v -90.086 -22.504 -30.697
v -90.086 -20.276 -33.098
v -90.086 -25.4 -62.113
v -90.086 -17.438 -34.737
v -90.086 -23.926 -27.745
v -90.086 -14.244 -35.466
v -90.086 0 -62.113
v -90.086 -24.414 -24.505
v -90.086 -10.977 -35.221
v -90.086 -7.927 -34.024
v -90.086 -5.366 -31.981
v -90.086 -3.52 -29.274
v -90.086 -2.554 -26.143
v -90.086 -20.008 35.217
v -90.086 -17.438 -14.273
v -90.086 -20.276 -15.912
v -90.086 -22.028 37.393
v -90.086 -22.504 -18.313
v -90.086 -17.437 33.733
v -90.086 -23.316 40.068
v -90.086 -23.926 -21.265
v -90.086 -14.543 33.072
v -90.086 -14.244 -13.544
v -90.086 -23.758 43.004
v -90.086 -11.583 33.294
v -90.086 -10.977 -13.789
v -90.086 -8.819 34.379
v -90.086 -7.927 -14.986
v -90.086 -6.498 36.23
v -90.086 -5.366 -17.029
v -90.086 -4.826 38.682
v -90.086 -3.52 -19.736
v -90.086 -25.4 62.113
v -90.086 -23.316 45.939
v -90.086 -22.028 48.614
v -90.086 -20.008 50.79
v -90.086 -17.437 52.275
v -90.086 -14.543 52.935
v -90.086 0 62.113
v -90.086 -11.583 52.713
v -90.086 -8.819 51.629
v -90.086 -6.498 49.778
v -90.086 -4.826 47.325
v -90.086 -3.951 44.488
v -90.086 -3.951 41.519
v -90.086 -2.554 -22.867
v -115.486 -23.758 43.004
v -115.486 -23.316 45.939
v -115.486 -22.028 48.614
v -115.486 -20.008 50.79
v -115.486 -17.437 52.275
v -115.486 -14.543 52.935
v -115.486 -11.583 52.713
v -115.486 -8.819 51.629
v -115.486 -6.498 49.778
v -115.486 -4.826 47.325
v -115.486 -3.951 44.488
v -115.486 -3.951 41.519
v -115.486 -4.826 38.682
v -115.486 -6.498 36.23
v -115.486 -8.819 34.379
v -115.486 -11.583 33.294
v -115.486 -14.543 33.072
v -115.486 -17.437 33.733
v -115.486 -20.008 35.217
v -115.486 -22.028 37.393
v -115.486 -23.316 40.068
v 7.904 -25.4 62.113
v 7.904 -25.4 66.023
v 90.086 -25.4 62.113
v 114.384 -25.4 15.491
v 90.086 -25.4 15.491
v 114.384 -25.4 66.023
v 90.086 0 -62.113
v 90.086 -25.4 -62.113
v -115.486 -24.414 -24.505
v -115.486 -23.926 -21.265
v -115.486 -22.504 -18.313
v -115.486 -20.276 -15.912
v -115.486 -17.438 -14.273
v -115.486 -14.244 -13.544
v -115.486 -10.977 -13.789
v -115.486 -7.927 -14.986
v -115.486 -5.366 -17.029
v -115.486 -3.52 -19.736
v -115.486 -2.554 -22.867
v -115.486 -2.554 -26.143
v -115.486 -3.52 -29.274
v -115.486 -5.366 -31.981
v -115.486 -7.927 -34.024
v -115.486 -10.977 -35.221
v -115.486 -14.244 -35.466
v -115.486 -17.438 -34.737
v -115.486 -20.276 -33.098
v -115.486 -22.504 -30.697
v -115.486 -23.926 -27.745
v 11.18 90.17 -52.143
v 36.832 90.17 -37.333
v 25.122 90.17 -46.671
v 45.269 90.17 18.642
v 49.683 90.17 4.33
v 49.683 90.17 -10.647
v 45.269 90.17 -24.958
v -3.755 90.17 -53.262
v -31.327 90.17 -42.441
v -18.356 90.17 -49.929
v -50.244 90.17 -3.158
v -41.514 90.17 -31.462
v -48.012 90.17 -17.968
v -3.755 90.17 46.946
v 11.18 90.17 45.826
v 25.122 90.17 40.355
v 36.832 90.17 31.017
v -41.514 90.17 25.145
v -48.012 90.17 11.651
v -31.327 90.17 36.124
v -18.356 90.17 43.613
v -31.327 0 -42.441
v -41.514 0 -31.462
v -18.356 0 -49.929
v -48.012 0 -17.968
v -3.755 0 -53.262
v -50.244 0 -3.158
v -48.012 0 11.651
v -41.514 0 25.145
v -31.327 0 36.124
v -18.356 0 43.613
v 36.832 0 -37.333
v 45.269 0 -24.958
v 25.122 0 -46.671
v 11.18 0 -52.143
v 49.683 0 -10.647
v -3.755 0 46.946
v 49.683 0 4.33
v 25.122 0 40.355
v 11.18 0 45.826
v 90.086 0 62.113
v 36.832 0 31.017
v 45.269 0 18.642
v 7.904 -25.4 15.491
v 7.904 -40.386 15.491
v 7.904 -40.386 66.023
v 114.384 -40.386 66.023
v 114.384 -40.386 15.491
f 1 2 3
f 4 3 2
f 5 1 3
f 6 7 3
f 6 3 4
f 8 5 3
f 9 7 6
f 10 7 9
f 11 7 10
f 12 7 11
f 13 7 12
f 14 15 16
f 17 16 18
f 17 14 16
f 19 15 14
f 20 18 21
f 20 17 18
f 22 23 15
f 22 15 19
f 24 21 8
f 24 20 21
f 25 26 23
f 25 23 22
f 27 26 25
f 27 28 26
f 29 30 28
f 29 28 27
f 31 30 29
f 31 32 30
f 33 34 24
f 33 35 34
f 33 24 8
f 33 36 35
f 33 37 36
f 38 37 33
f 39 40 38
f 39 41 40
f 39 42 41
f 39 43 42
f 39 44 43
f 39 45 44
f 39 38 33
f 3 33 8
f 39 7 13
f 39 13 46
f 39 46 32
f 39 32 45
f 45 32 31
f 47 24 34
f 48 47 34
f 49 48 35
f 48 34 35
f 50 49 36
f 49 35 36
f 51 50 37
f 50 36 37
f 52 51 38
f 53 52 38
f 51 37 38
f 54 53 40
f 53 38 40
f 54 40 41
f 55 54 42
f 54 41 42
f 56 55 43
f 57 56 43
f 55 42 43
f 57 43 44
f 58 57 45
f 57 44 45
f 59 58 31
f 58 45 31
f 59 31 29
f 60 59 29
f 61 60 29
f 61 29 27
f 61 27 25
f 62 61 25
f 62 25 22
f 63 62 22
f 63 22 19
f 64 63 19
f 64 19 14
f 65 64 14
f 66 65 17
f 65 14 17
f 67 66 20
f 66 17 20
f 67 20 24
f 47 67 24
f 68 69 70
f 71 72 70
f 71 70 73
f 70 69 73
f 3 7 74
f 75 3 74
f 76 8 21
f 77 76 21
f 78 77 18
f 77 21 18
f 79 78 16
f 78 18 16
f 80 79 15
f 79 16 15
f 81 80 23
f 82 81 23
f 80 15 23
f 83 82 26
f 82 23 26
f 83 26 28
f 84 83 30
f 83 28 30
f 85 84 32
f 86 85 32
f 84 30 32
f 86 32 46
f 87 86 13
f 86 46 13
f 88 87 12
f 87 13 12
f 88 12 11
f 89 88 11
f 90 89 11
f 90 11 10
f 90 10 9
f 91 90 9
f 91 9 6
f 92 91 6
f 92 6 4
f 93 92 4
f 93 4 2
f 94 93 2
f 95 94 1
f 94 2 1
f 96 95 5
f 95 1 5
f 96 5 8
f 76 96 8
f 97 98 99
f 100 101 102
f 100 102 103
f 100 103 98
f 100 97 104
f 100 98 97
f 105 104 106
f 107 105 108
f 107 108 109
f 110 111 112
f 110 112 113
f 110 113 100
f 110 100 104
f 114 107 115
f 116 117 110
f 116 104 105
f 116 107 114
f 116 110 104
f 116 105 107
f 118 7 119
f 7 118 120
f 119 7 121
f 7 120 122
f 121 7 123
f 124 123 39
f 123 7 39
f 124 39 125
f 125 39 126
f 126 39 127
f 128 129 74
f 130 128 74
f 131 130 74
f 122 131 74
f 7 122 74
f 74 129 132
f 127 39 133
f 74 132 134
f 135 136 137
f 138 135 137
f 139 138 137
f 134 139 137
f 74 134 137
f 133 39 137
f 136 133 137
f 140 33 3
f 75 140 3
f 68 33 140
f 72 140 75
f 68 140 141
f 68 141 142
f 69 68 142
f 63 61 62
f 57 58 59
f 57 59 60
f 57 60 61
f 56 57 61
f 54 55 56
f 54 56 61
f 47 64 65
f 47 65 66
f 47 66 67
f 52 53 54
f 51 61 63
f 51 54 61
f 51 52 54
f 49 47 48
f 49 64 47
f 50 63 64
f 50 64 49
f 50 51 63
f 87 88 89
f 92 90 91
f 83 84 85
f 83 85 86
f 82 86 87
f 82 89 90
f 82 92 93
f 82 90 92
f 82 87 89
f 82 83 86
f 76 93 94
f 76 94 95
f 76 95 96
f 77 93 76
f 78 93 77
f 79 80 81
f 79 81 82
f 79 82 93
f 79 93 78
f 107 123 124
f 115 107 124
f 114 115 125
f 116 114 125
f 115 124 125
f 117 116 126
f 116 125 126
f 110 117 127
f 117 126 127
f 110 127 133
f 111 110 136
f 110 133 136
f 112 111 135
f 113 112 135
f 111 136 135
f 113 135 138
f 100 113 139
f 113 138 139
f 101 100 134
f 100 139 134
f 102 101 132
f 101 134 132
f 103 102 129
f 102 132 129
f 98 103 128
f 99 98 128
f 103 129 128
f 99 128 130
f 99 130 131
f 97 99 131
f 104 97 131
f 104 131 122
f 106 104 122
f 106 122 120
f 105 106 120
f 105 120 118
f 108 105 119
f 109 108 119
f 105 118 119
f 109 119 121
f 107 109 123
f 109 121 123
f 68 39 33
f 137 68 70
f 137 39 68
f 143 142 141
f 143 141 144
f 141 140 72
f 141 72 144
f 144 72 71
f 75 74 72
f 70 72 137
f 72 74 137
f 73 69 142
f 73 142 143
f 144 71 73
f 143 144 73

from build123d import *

# Parameters (mm, degrees)
F0_W     = 180.17289
F0_H     = 124.226056
F1_DEPTH = 25.4
F2_R     = 9.959401
F2_R_2   = 10.991396
F3_DEPTH = 25.4
F4_R     = 50.24432
F5_DEPTH = 90.17
F6_W     = 106.479473
F6_H     = 50.532631
F7_DEPTH = 14.986


with BuildPart() as f1:
    # F0 (on Front) → F1 (new body)
    with BuildSketch(Plane.XZ):
        Rectangle(F0_W, F0_H)
    extrude(amount=F1_DEPTH)

    # F2 (on face) → F3 (join)
    with BuildSketch(Plane(origin=(-90.086445, 0, 0), x_dir=(0, -1, 0), z_dir=(-1, 0, 0))):
        with Locations((13.798693, 43.003704)):
            Circle(F2_R)
        with Locations((13.422888, -24.505027)):
            Circle(F2_R_2)
    extrude(amount=F3_DEPTH)

    # F4 (on face) → F5 (join)
    with BuildSketch(Plane(origin=(0, 0, 0), x_dir=(-1, 0, 0), z_dir=(0, 1, 0))):
        with Locations((0, -3.158289)):
            Circle(F4_R)
    extrude(amount=F5_DEPTH)

    # F6 (on face) → F7 (join)
    with BuildSketch(Plane.XZ.offset(25.4)):
        with Locations((61.143819, 40.756974)):
            Rectangle(F6_W, F6_H)
    extrude(amount=F7_DEPTH)


solid = f1.part
